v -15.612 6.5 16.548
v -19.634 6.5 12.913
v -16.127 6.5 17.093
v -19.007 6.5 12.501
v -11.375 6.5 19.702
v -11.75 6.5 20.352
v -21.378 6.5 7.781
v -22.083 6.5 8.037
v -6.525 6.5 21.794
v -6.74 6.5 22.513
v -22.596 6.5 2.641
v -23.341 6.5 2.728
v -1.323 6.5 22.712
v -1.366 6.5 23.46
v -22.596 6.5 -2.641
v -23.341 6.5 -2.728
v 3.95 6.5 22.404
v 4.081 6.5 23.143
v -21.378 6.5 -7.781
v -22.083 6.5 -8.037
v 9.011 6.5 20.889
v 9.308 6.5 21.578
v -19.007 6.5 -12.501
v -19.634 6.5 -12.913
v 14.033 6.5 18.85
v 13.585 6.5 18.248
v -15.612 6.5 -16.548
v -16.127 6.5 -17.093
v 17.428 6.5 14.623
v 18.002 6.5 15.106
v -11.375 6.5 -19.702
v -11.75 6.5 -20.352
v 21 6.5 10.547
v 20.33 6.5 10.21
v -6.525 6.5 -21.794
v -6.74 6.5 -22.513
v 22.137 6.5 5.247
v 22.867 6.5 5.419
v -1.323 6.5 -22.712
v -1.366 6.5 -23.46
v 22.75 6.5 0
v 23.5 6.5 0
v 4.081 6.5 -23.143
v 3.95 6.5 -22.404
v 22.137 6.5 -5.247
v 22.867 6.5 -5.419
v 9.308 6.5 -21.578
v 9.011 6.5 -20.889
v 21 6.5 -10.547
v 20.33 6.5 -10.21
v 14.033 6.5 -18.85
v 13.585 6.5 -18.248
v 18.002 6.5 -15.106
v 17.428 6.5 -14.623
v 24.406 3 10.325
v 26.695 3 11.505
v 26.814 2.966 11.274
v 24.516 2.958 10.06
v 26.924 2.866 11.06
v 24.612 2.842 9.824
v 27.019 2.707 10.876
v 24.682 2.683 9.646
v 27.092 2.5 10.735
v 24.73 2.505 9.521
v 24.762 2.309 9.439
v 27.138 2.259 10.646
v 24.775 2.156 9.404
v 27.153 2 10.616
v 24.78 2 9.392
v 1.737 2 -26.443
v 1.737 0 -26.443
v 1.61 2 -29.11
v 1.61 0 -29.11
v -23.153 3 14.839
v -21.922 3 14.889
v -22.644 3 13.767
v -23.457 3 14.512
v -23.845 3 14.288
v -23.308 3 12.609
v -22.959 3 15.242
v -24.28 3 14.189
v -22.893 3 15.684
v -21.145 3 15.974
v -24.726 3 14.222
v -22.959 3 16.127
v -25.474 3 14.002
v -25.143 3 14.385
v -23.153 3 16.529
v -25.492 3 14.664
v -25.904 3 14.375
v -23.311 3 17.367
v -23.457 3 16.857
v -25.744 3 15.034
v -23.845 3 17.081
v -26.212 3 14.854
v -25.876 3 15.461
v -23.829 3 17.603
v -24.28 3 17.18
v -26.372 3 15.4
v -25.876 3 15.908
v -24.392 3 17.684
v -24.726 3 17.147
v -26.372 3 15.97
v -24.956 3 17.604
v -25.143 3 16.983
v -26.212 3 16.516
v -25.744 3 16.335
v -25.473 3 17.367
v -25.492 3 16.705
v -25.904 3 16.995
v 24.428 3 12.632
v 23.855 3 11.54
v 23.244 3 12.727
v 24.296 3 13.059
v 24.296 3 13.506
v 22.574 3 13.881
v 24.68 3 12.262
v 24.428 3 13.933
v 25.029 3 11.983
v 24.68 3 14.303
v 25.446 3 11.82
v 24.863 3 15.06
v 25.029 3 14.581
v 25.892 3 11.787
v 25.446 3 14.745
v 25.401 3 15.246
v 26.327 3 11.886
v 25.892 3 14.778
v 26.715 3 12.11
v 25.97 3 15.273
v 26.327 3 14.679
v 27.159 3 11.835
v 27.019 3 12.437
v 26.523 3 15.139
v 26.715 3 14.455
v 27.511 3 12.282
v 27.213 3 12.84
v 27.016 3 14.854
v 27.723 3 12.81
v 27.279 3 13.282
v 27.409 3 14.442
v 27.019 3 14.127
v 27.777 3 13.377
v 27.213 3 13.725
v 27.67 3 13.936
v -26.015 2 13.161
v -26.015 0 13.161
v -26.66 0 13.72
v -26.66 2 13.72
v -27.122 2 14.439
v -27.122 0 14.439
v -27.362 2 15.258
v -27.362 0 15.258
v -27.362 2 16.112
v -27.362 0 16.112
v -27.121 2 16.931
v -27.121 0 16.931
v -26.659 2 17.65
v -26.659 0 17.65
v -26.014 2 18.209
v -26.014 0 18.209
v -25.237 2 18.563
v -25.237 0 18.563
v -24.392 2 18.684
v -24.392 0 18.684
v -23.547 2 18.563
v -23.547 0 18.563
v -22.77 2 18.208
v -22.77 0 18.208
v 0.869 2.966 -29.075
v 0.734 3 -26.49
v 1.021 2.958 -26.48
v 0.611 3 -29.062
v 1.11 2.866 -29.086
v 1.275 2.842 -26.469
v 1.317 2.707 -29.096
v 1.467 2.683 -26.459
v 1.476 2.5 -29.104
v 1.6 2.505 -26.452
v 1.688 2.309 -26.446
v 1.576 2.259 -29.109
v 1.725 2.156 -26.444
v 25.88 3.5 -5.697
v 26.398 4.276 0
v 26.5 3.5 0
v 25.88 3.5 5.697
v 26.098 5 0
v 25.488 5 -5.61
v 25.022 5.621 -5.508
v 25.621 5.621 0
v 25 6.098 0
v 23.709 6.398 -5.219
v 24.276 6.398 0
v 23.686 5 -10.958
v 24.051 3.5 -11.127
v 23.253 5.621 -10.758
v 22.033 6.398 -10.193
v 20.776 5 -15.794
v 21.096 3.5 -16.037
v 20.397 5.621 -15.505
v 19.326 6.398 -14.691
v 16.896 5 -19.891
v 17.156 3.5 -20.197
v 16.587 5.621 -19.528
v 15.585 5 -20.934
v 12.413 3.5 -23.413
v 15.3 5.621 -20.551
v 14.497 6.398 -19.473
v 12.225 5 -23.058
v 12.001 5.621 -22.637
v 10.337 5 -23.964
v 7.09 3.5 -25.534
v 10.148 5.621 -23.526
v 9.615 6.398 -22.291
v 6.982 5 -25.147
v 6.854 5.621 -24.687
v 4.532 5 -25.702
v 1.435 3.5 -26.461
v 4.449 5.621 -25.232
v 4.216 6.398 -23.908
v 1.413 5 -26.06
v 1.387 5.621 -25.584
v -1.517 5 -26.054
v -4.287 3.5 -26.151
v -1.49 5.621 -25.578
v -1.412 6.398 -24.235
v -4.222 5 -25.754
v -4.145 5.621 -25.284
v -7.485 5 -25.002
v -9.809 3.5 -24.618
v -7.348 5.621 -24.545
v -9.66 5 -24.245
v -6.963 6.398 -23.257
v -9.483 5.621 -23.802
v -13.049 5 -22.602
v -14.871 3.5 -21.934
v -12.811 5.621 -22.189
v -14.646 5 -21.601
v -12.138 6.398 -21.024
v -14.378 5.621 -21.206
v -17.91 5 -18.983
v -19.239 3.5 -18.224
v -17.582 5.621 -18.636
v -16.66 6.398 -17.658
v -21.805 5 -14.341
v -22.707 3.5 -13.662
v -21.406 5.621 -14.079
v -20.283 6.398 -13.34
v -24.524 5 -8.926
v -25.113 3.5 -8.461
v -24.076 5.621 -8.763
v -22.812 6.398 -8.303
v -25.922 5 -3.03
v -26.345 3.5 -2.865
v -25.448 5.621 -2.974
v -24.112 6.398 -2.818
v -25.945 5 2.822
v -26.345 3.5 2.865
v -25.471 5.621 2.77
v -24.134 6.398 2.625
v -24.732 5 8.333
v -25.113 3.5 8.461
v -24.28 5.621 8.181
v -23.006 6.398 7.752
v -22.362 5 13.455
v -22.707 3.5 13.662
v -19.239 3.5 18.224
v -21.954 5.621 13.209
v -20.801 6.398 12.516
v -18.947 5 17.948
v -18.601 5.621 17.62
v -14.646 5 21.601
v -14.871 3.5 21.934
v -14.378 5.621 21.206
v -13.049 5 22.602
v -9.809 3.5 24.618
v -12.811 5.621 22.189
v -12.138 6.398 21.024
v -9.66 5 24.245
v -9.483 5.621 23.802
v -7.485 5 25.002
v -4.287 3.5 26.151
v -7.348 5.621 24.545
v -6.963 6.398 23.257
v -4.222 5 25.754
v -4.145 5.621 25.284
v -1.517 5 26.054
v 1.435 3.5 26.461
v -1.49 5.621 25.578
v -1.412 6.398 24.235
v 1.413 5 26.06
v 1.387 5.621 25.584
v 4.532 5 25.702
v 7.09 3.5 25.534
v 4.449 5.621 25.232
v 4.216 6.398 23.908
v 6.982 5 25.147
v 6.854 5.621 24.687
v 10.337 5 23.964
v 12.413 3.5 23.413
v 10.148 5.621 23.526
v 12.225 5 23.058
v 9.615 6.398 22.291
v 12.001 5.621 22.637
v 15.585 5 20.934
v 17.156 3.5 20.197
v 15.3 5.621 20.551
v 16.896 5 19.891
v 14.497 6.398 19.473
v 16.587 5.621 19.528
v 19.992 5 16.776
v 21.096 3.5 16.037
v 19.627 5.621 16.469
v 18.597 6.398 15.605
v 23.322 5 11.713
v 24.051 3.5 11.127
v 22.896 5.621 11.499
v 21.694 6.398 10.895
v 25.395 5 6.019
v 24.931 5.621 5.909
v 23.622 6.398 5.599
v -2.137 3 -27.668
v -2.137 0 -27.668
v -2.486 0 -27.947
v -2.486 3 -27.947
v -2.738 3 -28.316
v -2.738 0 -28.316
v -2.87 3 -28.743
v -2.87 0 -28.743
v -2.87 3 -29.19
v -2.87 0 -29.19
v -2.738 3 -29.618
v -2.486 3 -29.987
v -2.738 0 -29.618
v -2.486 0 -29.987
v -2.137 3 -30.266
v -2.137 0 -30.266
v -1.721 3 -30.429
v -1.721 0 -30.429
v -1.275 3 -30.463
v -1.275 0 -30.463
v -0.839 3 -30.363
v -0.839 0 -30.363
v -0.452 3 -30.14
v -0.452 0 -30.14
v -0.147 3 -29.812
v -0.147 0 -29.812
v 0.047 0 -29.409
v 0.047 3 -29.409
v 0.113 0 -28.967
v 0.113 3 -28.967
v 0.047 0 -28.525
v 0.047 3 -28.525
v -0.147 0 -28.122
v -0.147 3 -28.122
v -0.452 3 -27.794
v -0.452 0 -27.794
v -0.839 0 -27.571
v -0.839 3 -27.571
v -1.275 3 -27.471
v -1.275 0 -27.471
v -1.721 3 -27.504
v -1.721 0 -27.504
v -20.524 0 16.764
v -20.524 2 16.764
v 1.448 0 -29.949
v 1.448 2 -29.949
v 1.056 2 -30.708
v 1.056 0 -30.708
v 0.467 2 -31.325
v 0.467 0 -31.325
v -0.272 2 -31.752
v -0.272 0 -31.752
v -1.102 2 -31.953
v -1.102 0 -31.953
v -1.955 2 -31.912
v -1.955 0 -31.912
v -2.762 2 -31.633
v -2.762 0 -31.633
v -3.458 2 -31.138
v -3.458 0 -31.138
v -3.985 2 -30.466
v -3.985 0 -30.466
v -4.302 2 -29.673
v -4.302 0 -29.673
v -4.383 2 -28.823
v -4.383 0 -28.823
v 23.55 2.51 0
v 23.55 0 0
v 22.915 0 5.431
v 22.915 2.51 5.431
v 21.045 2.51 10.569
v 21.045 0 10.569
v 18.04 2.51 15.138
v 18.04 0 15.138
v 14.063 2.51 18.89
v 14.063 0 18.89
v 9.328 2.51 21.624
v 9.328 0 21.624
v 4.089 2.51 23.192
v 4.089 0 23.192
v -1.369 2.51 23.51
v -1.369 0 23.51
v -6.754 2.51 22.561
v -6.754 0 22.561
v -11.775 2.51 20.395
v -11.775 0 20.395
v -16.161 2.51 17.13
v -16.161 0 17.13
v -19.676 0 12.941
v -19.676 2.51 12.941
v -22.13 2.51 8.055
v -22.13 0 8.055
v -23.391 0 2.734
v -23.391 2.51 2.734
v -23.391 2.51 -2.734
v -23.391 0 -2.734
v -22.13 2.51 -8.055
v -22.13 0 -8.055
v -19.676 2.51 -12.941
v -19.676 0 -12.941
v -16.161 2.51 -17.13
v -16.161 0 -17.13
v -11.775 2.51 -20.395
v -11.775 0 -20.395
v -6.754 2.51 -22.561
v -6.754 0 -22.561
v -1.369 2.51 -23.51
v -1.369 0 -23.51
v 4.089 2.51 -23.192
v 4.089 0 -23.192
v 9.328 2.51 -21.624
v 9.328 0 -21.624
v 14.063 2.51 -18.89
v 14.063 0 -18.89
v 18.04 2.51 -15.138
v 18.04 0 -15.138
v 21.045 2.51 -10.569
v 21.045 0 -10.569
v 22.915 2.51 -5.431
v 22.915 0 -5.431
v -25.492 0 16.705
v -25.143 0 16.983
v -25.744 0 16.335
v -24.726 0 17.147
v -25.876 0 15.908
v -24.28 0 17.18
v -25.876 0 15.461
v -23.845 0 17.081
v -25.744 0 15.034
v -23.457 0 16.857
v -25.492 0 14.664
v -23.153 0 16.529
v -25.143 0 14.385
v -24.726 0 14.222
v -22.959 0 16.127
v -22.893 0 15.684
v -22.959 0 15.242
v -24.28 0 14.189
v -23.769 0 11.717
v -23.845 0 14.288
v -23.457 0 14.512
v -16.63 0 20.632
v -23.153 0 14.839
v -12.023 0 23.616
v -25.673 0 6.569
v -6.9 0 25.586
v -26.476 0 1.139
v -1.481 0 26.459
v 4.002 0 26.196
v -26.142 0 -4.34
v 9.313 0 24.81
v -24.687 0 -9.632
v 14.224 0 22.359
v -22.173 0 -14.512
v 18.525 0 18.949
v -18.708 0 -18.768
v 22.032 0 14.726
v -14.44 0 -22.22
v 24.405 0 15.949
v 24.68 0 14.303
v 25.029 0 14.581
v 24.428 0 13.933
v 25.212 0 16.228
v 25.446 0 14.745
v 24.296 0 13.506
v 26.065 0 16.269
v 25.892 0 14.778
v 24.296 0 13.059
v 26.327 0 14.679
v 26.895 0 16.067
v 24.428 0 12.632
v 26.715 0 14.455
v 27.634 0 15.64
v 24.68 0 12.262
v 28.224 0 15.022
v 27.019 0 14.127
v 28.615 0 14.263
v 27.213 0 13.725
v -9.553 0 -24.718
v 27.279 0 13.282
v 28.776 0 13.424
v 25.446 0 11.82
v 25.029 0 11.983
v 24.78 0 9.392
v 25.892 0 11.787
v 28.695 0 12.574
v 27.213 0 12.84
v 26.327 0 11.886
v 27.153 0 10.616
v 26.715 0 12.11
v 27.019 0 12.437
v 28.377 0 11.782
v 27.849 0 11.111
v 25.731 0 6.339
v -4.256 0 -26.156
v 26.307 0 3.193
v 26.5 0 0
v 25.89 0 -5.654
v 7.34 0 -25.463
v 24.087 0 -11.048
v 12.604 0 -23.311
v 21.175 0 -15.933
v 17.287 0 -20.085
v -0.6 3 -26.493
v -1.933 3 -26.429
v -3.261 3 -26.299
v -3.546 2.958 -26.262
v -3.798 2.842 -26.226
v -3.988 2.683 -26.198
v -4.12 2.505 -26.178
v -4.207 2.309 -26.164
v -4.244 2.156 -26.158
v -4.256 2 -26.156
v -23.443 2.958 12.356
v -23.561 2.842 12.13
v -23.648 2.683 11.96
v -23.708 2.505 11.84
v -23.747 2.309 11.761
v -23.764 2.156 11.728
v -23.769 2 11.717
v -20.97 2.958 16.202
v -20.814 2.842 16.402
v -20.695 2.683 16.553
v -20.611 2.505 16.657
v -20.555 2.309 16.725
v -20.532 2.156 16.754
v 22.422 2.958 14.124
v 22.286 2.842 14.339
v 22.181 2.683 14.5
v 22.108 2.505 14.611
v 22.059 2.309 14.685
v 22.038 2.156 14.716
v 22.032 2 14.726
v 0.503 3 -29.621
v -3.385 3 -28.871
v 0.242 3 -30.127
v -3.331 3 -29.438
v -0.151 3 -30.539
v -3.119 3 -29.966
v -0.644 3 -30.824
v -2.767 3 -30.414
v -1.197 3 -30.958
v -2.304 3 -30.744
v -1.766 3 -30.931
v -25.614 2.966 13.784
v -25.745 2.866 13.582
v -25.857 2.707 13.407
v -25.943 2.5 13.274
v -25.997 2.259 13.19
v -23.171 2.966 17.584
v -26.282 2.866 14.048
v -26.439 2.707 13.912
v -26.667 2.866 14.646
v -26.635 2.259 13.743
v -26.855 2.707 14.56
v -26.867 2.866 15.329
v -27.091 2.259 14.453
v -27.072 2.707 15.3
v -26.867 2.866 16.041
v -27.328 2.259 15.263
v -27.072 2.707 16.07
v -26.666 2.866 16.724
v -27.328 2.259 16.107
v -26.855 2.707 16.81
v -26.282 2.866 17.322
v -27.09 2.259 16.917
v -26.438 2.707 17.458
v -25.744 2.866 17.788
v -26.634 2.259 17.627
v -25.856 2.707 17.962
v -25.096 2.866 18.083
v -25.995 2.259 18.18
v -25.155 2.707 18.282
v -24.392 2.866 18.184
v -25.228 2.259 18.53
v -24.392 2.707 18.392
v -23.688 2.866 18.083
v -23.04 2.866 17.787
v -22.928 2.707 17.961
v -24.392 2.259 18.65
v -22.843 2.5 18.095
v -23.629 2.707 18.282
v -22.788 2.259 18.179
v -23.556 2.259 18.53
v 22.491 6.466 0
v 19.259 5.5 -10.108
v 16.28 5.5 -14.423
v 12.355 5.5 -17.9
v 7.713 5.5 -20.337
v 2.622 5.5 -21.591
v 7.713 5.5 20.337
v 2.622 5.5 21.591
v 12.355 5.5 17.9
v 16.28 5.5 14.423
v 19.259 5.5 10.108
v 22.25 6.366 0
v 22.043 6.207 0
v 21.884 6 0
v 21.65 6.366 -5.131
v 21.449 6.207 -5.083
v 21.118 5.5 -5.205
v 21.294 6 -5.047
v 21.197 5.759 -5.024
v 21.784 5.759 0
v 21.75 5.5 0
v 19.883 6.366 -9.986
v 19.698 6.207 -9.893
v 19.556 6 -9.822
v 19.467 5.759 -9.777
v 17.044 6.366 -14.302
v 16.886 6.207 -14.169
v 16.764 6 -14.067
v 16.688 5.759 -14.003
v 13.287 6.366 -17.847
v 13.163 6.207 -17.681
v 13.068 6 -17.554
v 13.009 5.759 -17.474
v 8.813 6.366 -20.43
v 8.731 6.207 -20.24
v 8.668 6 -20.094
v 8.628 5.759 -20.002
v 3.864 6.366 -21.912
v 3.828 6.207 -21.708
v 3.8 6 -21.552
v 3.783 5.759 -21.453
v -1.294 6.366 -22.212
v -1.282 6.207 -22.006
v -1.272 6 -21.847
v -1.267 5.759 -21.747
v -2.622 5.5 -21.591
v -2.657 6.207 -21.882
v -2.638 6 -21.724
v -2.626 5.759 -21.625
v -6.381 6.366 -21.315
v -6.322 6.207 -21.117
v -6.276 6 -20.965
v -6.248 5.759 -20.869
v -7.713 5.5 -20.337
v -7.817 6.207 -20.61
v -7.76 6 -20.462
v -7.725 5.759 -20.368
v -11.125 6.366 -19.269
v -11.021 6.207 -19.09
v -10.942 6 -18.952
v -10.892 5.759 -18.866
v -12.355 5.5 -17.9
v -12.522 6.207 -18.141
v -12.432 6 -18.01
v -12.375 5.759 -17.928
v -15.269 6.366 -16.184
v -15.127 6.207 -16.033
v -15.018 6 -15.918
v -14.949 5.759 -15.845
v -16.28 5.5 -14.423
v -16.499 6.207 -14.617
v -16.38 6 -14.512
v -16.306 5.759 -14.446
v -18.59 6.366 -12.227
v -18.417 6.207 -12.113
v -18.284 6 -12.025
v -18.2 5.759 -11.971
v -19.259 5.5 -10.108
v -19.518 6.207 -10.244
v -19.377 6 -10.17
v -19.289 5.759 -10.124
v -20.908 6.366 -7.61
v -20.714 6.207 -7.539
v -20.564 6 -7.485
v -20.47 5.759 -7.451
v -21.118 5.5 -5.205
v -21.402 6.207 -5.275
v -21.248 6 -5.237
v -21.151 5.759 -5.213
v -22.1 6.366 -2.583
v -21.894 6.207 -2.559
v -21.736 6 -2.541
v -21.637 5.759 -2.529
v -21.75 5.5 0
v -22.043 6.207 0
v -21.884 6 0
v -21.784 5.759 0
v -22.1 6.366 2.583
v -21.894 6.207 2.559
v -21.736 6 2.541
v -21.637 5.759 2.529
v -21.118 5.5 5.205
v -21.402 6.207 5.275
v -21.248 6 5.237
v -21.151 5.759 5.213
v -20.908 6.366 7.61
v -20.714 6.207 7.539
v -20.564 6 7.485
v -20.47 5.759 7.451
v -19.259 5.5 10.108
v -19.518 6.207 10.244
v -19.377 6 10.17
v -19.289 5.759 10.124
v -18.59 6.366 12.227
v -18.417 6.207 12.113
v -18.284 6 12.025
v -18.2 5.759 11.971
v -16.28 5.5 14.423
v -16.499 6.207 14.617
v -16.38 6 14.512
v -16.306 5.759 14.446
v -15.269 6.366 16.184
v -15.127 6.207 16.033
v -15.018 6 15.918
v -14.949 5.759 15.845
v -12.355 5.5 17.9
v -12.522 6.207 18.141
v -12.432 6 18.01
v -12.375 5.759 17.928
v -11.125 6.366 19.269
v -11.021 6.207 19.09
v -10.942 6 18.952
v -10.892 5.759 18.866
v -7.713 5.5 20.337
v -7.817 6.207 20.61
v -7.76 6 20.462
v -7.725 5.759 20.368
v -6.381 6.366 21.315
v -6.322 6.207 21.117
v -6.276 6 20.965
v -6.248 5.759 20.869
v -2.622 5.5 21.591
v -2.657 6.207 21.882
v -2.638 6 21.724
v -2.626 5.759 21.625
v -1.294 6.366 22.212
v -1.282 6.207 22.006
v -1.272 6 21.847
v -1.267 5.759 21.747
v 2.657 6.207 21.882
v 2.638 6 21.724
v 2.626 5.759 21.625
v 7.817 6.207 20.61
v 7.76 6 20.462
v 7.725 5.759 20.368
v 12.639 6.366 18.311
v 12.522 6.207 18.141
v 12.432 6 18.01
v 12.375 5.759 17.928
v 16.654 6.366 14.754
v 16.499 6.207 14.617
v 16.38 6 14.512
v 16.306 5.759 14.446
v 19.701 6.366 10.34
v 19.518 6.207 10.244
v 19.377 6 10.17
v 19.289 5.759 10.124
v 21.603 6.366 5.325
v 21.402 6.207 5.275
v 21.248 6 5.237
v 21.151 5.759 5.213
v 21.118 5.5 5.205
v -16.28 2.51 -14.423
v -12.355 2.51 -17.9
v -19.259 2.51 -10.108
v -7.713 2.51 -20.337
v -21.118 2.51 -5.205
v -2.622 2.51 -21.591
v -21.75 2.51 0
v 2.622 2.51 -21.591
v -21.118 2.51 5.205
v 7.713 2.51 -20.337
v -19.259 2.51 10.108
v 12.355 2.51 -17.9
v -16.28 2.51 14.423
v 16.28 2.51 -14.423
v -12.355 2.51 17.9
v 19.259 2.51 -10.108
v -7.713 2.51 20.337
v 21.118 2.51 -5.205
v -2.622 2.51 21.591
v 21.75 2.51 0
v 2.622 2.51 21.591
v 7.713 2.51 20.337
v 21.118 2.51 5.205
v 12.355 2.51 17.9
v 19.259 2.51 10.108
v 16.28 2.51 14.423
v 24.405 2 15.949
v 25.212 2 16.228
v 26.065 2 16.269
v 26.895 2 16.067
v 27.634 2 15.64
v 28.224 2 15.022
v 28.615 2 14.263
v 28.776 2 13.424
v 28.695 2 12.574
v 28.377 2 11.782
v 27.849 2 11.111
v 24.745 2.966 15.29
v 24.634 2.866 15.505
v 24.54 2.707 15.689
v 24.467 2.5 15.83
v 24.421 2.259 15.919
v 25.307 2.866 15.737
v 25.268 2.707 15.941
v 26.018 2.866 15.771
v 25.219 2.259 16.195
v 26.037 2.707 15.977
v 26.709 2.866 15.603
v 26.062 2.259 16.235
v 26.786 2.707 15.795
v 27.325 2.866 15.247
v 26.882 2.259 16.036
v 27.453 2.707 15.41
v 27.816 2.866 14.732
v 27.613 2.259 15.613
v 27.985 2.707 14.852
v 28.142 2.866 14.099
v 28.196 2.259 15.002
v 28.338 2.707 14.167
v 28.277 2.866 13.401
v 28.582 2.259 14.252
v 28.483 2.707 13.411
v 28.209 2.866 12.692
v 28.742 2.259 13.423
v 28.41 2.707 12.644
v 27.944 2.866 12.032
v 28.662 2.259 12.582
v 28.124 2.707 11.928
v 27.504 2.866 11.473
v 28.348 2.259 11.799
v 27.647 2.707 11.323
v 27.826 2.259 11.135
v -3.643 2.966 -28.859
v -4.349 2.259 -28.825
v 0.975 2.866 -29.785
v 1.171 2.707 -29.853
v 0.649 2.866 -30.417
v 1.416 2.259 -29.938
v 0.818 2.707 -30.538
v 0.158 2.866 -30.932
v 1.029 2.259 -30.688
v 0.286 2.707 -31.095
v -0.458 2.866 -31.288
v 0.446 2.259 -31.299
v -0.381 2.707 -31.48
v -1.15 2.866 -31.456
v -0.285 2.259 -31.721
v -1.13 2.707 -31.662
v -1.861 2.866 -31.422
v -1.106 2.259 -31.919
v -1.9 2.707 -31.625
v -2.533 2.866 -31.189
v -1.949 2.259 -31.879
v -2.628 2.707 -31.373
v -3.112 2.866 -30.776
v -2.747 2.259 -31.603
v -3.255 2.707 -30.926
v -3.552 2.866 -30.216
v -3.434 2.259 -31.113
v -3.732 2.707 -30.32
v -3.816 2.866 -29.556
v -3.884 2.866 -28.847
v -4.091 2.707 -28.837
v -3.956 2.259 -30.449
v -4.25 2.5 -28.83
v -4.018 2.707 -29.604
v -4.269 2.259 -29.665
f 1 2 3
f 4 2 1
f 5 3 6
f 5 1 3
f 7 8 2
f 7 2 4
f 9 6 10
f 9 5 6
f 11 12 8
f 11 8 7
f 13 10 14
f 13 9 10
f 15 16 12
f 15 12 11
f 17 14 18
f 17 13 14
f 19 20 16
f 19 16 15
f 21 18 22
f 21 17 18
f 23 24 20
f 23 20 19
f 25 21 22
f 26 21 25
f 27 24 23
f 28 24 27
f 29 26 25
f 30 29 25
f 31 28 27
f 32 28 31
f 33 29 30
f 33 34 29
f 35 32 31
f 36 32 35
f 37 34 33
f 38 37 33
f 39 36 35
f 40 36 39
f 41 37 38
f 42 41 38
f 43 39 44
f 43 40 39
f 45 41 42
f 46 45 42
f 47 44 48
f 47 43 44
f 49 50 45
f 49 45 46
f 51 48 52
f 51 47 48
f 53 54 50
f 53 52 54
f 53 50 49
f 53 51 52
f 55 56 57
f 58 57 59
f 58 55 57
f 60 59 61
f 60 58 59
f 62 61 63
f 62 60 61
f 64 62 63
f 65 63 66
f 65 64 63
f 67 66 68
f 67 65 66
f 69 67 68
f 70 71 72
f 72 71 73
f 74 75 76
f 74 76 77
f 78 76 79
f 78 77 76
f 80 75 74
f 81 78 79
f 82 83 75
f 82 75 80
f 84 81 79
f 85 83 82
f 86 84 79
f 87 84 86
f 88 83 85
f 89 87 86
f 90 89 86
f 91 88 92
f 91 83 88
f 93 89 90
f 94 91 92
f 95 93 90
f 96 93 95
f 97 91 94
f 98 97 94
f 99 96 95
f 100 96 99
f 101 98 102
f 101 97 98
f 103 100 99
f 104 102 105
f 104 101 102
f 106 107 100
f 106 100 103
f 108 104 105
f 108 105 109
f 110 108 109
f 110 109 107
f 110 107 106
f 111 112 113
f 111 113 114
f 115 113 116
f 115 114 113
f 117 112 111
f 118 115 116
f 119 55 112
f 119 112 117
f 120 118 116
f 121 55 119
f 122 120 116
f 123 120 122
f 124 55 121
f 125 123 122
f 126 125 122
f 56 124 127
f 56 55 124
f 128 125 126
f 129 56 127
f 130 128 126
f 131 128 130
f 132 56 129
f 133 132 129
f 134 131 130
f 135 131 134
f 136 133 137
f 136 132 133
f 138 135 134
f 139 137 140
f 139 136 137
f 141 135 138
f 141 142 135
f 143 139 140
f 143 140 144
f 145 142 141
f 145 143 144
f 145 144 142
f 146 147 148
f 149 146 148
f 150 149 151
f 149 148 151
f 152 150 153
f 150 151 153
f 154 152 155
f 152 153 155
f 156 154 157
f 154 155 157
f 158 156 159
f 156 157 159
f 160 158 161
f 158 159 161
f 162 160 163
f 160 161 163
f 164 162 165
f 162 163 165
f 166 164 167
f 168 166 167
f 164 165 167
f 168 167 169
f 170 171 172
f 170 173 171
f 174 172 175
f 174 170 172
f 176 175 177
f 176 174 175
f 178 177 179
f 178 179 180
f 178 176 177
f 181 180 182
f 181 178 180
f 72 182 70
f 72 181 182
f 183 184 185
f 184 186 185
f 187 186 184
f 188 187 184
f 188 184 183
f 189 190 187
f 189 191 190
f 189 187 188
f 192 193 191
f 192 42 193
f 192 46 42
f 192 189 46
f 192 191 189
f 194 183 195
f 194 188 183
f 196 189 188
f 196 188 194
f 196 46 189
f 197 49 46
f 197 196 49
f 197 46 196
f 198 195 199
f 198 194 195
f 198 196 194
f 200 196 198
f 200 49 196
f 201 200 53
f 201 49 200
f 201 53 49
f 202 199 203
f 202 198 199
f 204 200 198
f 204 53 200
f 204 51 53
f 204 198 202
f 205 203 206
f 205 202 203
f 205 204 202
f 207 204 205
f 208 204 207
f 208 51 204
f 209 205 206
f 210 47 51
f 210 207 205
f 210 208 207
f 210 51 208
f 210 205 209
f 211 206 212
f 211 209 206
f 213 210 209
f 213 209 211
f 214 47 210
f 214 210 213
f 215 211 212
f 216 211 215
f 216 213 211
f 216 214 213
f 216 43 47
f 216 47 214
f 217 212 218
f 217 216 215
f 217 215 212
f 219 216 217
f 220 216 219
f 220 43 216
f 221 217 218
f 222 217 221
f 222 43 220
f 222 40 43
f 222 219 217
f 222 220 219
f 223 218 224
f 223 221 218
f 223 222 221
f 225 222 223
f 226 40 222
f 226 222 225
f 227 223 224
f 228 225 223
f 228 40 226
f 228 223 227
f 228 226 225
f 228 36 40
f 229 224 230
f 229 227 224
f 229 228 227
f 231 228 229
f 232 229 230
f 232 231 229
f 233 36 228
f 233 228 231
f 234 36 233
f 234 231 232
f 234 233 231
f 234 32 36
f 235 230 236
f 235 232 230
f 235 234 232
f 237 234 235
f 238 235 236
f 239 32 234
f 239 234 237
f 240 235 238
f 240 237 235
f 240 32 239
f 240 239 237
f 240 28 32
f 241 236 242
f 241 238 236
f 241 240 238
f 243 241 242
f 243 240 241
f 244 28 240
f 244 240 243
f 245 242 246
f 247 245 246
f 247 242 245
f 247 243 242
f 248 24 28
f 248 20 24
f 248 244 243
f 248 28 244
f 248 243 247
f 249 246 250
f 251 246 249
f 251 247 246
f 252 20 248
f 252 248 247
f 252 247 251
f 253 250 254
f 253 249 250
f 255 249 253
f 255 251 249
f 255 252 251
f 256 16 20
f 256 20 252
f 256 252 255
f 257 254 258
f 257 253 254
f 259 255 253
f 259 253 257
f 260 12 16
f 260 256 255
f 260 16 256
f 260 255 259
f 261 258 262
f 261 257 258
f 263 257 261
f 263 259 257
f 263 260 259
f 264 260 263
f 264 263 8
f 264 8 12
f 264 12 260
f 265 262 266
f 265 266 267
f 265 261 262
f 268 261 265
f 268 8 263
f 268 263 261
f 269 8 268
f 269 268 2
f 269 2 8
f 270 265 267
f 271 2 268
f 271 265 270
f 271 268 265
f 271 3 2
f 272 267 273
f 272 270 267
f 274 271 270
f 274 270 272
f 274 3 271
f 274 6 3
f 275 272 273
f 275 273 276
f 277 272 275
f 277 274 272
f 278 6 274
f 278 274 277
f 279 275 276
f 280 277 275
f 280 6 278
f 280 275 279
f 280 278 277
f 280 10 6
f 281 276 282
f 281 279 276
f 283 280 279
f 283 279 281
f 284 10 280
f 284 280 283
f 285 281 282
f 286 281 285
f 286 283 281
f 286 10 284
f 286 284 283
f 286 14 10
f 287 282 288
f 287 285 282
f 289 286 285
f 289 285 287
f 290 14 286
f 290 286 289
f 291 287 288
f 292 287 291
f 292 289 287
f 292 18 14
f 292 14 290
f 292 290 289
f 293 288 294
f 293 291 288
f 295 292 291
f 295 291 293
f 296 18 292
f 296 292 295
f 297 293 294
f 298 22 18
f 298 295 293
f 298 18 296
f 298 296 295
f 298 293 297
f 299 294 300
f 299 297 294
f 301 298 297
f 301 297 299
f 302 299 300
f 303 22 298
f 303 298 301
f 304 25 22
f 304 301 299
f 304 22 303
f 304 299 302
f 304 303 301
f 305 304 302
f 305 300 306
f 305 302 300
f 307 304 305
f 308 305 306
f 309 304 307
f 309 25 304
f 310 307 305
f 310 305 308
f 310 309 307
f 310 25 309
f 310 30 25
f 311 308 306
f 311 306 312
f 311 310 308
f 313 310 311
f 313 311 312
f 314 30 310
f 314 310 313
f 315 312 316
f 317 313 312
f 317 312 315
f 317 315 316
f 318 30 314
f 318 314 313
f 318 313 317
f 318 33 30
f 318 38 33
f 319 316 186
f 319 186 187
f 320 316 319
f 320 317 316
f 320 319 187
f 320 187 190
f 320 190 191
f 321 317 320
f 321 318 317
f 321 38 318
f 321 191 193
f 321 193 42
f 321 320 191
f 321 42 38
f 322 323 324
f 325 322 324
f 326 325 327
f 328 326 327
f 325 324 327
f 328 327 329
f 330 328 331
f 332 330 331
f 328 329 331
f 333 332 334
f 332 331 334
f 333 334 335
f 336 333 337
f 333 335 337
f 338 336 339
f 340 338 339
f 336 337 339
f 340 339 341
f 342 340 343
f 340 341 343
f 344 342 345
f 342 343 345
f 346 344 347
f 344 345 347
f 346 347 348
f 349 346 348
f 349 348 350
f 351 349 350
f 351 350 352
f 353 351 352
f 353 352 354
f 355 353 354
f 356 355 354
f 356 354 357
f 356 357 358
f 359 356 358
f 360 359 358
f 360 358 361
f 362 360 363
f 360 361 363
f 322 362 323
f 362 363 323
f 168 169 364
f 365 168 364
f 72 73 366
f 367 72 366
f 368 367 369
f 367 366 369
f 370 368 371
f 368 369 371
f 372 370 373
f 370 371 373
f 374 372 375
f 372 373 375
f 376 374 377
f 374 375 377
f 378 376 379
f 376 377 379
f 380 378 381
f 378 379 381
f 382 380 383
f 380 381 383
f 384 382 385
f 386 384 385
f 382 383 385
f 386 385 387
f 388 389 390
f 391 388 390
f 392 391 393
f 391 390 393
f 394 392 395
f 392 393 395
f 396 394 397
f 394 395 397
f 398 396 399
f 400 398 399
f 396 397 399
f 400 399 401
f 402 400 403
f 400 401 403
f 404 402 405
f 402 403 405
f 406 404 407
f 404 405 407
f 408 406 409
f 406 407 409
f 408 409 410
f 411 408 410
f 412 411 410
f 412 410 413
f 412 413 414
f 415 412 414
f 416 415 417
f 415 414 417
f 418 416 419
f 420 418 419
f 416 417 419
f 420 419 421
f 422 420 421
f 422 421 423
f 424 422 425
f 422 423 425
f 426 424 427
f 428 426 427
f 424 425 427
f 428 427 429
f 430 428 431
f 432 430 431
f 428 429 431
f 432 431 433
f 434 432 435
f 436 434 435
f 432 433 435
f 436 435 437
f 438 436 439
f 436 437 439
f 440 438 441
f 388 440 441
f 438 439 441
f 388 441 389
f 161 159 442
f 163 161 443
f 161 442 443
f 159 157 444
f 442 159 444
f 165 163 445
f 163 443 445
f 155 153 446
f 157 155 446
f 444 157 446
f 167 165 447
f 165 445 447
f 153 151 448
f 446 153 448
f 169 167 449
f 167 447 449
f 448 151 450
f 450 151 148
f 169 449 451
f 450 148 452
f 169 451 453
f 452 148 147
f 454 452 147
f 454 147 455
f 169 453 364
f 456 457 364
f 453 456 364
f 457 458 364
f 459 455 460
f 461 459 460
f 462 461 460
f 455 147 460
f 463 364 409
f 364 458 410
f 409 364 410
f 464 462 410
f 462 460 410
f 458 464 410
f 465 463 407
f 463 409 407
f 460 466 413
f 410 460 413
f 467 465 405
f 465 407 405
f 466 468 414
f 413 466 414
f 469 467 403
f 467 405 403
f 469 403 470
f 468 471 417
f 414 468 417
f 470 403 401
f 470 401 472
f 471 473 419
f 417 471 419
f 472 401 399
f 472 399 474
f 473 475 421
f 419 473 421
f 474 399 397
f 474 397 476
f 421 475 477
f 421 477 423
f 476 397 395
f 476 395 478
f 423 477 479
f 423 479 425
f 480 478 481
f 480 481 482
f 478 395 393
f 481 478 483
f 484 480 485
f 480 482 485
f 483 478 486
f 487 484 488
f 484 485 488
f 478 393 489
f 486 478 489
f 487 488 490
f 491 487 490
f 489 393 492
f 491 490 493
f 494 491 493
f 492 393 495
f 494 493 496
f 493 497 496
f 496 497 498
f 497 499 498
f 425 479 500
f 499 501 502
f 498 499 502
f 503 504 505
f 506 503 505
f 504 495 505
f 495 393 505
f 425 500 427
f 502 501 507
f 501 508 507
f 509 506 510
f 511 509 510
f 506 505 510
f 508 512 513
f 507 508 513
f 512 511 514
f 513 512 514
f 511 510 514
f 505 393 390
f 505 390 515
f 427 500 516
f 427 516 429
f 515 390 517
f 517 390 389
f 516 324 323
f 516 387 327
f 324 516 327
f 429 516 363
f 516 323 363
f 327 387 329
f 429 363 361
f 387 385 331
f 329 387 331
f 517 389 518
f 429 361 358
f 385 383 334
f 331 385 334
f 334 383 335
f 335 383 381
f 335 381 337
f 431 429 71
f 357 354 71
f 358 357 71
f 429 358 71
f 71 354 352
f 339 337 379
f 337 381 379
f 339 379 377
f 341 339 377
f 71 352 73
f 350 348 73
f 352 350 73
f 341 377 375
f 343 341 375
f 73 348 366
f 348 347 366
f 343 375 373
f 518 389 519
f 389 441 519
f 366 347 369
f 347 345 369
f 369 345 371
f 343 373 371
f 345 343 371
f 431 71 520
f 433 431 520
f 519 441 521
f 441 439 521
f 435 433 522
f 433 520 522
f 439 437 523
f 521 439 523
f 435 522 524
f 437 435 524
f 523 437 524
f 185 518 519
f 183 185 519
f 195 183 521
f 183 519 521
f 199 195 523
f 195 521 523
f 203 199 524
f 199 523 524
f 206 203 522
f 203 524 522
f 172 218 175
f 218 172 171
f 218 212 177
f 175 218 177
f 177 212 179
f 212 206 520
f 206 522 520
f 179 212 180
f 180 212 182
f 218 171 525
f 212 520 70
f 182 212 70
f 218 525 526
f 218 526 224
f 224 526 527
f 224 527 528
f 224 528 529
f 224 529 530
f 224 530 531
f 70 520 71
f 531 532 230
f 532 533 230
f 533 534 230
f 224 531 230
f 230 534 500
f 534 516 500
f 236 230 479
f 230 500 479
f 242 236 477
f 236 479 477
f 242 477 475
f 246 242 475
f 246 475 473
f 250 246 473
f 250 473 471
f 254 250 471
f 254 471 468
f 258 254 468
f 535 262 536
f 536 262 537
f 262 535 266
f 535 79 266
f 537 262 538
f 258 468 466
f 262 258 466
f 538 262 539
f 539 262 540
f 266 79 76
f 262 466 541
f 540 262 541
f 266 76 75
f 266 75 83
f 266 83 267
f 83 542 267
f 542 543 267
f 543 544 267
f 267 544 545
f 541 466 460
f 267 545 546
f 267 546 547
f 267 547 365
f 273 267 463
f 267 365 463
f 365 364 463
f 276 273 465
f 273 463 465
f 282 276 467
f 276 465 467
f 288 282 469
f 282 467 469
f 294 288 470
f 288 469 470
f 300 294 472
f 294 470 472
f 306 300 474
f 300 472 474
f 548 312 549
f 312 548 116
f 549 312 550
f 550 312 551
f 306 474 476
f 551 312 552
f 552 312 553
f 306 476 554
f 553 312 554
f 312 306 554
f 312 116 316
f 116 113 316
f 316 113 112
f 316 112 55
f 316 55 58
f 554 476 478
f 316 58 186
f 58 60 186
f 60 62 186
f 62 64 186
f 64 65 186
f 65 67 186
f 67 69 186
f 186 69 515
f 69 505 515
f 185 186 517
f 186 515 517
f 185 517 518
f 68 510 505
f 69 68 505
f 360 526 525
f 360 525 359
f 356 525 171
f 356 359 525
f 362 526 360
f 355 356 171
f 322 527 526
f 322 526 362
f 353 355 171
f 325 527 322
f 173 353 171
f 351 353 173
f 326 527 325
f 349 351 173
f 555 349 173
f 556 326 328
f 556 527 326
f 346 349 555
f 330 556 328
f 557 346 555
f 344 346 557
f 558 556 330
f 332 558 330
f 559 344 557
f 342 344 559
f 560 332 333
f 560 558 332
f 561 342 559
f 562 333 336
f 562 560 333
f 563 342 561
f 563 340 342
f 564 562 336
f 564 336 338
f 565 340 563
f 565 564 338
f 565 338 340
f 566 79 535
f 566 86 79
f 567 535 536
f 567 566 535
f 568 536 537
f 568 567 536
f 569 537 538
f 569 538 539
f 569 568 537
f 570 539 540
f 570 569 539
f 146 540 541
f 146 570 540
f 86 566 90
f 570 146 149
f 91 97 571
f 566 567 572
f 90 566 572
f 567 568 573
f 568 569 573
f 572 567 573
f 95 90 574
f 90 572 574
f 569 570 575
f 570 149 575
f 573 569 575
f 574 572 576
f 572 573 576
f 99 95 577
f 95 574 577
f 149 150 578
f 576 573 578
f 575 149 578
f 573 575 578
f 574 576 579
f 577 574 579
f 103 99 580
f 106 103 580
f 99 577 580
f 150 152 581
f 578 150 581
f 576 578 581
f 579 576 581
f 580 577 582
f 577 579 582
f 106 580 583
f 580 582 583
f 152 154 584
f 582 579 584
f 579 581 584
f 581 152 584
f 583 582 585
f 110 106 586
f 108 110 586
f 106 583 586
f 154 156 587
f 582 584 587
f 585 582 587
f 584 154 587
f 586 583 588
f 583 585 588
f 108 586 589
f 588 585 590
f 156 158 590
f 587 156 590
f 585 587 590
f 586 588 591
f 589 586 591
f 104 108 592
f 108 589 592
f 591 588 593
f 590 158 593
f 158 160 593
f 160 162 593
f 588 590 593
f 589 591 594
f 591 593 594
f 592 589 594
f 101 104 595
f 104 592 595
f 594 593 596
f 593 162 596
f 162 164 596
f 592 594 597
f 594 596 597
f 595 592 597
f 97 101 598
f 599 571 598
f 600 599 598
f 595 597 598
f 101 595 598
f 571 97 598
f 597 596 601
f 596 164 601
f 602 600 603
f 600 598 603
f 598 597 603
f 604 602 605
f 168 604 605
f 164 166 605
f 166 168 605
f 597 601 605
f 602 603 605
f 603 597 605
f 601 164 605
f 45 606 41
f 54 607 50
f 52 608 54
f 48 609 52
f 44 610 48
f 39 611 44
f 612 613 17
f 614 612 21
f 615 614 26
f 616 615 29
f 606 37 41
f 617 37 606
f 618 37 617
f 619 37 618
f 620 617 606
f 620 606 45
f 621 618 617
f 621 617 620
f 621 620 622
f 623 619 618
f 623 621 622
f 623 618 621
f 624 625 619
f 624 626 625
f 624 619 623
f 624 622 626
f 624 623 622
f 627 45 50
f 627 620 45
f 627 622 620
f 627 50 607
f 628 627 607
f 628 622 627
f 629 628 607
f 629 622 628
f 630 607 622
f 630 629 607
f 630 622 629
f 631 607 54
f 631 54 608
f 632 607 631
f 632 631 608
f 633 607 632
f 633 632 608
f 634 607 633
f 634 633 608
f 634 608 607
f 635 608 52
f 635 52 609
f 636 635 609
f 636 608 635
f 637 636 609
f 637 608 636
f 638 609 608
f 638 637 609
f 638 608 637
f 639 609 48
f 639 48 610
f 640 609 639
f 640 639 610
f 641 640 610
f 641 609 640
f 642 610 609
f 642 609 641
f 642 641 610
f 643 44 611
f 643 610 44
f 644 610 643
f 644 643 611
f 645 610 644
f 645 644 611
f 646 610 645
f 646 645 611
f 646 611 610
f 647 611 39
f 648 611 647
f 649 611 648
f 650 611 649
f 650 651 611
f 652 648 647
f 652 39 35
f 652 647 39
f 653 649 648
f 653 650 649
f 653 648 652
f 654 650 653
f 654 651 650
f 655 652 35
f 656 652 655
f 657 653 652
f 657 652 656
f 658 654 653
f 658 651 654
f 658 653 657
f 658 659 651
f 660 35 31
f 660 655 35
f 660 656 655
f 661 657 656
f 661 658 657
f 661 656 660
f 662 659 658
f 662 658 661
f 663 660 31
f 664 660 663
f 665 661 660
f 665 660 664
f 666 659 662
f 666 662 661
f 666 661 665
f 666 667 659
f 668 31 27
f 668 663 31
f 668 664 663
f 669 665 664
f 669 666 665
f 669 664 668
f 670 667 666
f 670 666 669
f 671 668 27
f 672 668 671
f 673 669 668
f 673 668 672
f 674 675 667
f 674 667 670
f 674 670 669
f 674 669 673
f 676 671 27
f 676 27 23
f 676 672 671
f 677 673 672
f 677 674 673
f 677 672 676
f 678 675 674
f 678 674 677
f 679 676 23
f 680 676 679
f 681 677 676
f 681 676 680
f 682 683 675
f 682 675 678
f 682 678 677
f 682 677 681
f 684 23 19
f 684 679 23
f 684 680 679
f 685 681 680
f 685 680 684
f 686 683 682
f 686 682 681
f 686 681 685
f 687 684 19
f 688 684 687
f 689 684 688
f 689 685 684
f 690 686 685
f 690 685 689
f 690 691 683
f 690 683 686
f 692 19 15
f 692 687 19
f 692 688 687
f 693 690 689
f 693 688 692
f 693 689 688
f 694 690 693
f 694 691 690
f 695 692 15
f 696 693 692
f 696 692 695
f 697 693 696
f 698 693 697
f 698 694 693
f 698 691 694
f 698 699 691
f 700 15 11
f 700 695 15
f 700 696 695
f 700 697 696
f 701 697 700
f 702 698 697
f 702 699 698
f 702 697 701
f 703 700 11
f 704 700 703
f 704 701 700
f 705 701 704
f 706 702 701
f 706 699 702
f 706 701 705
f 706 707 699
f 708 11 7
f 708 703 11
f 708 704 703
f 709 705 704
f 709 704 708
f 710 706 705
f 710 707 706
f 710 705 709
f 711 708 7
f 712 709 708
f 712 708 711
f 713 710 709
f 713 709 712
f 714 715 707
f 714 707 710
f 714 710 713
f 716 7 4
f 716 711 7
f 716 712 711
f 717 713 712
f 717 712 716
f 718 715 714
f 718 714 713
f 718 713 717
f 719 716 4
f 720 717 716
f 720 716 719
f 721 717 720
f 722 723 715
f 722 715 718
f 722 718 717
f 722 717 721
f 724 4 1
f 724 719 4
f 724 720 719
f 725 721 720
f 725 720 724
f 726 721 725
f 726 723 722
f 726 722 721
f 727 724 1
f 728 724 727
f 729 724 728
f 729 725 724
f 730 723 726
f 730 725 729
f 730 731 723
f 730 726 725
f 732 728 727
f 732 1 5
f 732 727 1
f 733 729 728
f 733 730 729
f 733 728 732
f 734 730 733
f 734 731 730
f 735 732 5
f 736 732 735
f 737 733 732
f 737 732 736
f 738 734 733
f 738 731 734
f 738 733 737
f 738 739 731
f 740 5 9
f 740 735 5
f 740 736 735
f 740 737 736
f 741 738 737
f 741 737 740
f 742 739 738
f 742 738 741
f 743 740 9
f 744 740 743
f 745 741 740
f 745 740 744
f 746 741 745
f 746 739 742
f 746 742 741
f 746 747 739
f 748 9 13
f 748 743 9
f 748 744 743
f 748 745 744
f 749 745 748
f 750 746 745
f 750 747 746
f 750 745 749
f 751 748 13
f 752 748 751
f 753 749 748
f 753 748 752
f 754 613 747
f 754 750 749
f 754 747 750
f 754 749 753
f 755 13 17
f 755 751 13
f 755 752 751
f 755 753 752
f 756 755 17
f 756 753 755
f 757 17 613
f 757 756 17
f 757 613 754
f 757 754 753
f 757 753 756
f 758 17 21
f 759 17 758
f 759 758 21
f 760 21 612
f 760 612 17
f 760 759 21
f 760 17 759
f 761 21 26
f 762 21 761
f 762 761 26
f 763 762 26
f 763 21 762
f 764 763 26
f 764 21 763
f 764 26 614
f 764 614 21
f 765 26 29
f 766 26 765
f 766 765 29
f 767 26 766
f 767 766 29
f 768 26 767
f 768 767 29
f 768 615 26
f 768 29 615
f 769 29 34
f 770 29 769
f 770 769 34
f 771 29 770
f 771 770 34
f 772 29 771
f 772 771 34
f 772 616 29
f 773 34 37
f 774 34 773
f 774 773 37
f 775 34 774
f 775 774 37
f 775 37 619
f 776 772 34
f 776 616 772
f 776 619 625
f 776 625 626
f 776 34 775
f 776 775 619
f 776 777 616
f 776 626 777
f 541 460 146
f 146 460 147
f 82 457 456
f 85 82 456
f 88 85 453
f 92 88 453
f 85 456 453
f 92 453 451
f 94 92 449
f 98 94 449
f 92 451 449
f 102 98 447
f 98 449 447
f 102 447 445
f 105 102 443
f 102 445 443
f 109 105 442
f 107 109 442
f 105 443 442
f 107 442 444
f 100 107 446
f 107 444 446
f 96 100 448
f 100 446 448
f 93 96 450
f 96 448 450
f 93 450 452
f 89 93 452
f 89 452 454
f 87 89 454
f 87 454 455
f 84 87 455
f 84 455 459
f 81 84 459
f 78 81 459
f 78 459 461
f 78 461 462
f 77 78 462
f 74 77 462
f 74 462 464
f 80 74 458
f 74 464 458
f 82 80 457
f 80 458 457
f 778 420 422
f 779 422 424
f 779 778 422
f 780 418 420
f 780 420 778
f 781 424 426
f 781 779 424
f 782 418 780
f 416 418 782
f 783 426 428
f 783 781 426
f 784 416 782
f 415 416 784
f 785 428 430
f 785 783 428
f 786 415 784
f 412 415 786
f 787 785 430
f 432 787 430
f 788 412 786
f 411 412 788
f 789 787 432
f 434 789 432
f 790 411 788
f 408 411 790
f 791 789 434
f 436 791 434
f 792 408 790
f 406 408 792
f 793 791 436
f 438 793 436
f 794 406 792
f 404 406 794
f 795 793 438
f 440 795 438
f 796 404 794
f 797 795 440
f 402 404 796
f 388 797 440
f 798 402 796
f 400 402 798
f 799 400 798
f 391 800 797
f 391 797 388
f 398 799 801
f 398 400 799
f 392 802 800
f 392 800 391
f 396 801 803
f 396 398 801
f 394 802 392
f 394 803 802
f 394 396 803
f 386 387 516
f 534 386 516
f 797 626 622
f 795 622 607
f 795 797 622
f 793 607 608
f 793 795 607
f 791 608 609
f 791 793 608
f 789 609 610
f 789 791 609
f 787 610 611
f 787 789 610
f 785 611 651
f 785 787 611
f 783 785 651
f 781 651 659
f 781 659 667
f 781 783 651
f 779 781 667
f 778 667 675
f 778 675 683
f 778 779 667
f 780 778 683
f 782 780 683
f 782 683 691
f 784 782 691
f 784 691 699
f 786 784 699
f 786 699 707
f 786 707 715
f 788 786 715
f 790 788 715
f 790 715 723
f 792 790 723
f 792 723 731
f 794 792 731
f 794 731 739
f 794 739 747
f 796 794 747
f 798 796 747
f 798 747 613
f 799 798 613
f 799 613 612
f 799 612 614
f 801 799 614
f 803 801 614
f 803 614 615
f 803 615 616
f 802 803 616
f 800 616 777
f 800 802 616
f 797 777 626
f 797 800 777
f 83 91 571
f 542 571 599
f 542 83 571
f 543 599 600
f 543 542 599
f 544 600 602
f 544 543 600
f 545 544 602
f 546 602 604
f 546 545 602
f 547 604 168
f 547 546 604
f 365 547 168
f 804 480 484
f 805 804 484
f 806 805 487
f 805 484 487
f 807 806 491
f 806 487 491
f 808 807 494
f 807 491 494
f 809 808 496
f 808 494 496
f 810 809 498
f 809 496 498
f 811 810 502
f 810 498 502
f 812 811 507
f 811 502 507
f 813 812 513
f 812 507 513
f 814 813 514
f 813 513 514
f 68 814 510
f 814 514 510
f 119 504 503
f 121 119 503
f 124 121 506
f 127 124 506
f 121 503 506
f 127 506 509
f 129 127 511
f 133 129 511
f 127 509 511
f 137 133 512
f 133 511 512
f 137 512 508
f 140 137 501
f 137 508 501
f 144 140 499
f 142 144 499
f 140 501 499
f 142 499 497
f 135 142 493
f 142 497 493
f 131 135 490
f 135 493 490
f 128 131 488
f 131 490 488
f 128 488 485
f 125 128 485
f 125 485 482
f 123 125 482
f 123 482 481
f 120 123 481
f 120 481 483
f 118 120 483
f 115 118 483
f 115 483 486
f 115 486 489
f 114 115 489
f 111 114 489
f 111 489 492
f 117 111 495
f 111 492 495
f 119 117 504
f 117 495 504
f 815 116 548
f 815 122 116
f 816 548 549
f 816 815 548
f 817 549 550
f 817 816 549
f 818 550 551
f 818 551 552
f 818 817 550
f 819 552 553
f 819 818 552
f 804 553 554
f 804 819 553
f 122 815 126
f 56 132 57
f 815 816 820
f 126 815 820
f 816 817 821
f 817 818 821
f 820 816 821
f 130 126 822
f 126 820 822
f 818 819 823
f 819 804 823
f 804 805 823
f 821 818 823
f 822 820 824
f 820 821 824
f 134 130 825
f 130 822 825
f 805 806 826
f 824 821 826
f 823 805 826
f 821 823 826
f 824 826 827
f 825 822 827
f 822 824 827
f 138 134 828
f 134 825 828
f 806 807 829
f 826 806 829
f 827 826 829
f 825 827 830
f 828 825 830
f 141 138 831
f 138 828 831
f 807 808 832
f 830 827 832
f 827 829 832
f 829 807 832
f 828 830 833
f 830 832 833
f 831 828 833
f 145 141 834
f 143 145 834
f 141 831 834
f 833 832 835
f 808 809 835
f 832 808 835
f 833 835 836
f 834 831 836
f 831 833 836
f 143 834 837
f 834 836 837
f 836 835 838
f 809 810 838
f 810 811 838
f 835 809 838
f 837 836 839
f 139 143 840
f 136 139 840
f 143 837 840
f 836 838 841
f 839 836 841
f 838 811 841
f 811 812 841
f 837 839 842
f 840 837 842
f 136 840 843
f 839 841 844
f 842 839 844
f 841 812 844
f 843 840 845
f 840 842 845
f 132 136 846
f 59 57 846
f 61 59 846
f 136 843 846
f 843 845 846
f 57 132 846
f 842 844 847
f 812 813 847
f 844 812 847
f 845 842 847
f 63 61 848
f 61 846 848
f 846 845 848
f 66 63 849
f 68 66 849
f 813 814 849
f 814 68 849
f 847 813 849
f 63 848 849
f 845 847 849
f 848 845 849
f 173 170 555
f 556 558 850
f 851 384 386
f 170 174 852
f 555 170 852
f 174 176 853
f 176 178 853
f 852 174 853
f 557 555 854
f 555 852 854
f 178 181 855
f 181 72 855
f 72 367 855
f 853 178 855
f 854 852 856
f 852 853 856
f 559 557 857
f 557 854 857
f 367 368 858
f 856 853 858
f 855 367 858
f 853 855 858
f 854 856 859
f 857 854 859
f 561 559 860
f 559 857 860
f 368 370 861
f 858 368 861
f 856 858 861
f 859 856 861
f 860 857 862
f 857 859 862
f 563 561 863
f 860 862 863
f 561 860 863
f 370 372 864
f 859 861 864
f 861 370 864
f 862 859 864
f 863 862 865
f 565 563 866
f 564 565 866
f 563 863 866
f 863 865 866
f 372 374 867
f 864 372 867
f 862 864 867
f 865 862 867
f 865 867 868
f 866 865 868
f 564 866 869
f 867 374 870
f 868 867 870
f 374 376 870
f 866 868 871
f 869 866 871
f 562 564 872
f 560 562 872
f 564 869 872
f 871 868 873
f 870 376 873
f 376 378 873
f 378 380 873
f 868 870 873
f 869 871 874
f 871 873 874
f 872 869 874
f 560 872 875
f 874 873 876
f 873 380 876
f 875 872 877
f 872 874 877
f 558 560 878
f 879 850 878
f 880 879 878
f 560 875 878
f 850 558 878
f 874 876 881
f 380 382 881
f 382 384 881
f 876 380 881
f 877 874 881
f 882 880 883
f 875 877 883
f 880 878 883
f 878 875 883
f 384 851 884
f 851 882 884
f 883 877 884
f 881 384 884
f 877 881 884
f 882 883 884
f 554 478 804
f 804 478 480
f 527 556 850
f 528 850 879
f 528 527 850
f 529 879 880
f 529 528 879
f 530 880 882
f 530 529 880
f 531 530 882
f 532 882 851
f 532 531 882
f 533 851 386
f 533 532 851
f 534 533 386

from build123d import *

# Parameters (mm, degrees)
SKETCH1_R           = 26.5
SKETCH1_R_2         = 21.75
BOSS_EXTRUDE1_DEPTH = 6.5
FILLET1_R           = 3
SKETCH2_R           = 23.55
SKETCH2_R_2         = 21.75
CUT_EXTRUDE1_DEPTH  = 2.51
SKETCH3_R           = 1.5
BOSS_EXTRUDE2_DEPTH = 3
CIRPATTERN1_COUNT   = 3
FILLET2_R           = 1
FILLET4_R           = 1


with BuildPart() as part:
    # Sketch1 → Boss-Extrude1 (new body)
    with BuildSketch(Plane(origin=(0, 0, 0), x_dir=(1, 0, 0), z_dir=(0, 1, 0))):
        Circle(SKETCH1_R)
        Circle(SKETCH1_R_2, mode=Mode.SUBTRACT)
    extrude(amount=BOSS_EXTRUDE1_DEPTH)

    # Fillet1
    fillet1_edges = [part.edges().sort_by_distance(p)[0] for p in [
        (-26.5, 6.5, 0),
    ]]
    fillet(fillet1_edges, radius=FILLET1_R)

    # Sketch2 → Cut-Extrude1 (cut)
    with BuildSketch(Plane.XZ):
        Circle(SKETCH2_R)
        Circle(SKETCH2_R_2, mode=Mode.SUBTRACT)
    extrude(amount=-CUT_EXTRUDE1_DEPTH, mode=Mode.SUBTRACT)

    # Sketch3 → Boss-Extrude2 (add)
    with BuildSketch(Plane.XZ):
        with BuildLine():
            Line((-20.523964569, 16.763558046), (-23.769018949, 11.716814337))
            Line((-23.769018949, 11.716814337), (-26.015121786, 13.161057649))
            ThreePointArc((-26.015121786, 13.161057649), (-26.915966451, 17.306956694), (-22.770067406, 18.207801359))
            Line((-22.770067406, 18.207801359), (-20.523964569, 16.763558046))
        make_face()
        with Locations((-24.392594596, 15.684429504)):
            Circle(SKETCH3_R, mode=Mode.SUBTRACT)
    boss_extrude2 = extrude(amount=-BOSS_EXTRUDE2_DEPTH)

    # CirPattern1: Boss-Extrude2 ×3 about axis
    cirpattern1_axis = Axis((0, 0, 0), (0, 1, 0))
    for i in range(1, CIRPATTERN1_COUNT):
        add(boss_extrude2.rotate(cirpattern1_axis, i * 360 / CIRPATTERN1_COUNT))

    # Fillet2
    fillet2_edges = [part.edges().sort_by_distance(p)[0] for p in [
        (-21.75, 6.5, 0),
    ]]
    fillet(fillet2_edges, radius=FILLET2_R)

    # Fillet4
    fillet4_edges = [part.edges().sort_by_distance(p)[0] for p in [
        (-21.647015988, 3, 17.485679702),
        (-24.892070368, 3, 12.438935993),
        (-26.915966451, 3, 17.306956694),
        (-4.319534831, 3, -27.489705613),
        (1.673600618, 3, -27.776633288),
        (-1.530280933, 3, -31.963389061),
        (25.966550819, 3, 10.00402591),
        (23.21846975, 3, 15.337697295),
        (28.446247385, 3, 14.656432367),
    ]]
    fillet(fillet4_edges, radius=FILLET4_R)


solid = part.part
